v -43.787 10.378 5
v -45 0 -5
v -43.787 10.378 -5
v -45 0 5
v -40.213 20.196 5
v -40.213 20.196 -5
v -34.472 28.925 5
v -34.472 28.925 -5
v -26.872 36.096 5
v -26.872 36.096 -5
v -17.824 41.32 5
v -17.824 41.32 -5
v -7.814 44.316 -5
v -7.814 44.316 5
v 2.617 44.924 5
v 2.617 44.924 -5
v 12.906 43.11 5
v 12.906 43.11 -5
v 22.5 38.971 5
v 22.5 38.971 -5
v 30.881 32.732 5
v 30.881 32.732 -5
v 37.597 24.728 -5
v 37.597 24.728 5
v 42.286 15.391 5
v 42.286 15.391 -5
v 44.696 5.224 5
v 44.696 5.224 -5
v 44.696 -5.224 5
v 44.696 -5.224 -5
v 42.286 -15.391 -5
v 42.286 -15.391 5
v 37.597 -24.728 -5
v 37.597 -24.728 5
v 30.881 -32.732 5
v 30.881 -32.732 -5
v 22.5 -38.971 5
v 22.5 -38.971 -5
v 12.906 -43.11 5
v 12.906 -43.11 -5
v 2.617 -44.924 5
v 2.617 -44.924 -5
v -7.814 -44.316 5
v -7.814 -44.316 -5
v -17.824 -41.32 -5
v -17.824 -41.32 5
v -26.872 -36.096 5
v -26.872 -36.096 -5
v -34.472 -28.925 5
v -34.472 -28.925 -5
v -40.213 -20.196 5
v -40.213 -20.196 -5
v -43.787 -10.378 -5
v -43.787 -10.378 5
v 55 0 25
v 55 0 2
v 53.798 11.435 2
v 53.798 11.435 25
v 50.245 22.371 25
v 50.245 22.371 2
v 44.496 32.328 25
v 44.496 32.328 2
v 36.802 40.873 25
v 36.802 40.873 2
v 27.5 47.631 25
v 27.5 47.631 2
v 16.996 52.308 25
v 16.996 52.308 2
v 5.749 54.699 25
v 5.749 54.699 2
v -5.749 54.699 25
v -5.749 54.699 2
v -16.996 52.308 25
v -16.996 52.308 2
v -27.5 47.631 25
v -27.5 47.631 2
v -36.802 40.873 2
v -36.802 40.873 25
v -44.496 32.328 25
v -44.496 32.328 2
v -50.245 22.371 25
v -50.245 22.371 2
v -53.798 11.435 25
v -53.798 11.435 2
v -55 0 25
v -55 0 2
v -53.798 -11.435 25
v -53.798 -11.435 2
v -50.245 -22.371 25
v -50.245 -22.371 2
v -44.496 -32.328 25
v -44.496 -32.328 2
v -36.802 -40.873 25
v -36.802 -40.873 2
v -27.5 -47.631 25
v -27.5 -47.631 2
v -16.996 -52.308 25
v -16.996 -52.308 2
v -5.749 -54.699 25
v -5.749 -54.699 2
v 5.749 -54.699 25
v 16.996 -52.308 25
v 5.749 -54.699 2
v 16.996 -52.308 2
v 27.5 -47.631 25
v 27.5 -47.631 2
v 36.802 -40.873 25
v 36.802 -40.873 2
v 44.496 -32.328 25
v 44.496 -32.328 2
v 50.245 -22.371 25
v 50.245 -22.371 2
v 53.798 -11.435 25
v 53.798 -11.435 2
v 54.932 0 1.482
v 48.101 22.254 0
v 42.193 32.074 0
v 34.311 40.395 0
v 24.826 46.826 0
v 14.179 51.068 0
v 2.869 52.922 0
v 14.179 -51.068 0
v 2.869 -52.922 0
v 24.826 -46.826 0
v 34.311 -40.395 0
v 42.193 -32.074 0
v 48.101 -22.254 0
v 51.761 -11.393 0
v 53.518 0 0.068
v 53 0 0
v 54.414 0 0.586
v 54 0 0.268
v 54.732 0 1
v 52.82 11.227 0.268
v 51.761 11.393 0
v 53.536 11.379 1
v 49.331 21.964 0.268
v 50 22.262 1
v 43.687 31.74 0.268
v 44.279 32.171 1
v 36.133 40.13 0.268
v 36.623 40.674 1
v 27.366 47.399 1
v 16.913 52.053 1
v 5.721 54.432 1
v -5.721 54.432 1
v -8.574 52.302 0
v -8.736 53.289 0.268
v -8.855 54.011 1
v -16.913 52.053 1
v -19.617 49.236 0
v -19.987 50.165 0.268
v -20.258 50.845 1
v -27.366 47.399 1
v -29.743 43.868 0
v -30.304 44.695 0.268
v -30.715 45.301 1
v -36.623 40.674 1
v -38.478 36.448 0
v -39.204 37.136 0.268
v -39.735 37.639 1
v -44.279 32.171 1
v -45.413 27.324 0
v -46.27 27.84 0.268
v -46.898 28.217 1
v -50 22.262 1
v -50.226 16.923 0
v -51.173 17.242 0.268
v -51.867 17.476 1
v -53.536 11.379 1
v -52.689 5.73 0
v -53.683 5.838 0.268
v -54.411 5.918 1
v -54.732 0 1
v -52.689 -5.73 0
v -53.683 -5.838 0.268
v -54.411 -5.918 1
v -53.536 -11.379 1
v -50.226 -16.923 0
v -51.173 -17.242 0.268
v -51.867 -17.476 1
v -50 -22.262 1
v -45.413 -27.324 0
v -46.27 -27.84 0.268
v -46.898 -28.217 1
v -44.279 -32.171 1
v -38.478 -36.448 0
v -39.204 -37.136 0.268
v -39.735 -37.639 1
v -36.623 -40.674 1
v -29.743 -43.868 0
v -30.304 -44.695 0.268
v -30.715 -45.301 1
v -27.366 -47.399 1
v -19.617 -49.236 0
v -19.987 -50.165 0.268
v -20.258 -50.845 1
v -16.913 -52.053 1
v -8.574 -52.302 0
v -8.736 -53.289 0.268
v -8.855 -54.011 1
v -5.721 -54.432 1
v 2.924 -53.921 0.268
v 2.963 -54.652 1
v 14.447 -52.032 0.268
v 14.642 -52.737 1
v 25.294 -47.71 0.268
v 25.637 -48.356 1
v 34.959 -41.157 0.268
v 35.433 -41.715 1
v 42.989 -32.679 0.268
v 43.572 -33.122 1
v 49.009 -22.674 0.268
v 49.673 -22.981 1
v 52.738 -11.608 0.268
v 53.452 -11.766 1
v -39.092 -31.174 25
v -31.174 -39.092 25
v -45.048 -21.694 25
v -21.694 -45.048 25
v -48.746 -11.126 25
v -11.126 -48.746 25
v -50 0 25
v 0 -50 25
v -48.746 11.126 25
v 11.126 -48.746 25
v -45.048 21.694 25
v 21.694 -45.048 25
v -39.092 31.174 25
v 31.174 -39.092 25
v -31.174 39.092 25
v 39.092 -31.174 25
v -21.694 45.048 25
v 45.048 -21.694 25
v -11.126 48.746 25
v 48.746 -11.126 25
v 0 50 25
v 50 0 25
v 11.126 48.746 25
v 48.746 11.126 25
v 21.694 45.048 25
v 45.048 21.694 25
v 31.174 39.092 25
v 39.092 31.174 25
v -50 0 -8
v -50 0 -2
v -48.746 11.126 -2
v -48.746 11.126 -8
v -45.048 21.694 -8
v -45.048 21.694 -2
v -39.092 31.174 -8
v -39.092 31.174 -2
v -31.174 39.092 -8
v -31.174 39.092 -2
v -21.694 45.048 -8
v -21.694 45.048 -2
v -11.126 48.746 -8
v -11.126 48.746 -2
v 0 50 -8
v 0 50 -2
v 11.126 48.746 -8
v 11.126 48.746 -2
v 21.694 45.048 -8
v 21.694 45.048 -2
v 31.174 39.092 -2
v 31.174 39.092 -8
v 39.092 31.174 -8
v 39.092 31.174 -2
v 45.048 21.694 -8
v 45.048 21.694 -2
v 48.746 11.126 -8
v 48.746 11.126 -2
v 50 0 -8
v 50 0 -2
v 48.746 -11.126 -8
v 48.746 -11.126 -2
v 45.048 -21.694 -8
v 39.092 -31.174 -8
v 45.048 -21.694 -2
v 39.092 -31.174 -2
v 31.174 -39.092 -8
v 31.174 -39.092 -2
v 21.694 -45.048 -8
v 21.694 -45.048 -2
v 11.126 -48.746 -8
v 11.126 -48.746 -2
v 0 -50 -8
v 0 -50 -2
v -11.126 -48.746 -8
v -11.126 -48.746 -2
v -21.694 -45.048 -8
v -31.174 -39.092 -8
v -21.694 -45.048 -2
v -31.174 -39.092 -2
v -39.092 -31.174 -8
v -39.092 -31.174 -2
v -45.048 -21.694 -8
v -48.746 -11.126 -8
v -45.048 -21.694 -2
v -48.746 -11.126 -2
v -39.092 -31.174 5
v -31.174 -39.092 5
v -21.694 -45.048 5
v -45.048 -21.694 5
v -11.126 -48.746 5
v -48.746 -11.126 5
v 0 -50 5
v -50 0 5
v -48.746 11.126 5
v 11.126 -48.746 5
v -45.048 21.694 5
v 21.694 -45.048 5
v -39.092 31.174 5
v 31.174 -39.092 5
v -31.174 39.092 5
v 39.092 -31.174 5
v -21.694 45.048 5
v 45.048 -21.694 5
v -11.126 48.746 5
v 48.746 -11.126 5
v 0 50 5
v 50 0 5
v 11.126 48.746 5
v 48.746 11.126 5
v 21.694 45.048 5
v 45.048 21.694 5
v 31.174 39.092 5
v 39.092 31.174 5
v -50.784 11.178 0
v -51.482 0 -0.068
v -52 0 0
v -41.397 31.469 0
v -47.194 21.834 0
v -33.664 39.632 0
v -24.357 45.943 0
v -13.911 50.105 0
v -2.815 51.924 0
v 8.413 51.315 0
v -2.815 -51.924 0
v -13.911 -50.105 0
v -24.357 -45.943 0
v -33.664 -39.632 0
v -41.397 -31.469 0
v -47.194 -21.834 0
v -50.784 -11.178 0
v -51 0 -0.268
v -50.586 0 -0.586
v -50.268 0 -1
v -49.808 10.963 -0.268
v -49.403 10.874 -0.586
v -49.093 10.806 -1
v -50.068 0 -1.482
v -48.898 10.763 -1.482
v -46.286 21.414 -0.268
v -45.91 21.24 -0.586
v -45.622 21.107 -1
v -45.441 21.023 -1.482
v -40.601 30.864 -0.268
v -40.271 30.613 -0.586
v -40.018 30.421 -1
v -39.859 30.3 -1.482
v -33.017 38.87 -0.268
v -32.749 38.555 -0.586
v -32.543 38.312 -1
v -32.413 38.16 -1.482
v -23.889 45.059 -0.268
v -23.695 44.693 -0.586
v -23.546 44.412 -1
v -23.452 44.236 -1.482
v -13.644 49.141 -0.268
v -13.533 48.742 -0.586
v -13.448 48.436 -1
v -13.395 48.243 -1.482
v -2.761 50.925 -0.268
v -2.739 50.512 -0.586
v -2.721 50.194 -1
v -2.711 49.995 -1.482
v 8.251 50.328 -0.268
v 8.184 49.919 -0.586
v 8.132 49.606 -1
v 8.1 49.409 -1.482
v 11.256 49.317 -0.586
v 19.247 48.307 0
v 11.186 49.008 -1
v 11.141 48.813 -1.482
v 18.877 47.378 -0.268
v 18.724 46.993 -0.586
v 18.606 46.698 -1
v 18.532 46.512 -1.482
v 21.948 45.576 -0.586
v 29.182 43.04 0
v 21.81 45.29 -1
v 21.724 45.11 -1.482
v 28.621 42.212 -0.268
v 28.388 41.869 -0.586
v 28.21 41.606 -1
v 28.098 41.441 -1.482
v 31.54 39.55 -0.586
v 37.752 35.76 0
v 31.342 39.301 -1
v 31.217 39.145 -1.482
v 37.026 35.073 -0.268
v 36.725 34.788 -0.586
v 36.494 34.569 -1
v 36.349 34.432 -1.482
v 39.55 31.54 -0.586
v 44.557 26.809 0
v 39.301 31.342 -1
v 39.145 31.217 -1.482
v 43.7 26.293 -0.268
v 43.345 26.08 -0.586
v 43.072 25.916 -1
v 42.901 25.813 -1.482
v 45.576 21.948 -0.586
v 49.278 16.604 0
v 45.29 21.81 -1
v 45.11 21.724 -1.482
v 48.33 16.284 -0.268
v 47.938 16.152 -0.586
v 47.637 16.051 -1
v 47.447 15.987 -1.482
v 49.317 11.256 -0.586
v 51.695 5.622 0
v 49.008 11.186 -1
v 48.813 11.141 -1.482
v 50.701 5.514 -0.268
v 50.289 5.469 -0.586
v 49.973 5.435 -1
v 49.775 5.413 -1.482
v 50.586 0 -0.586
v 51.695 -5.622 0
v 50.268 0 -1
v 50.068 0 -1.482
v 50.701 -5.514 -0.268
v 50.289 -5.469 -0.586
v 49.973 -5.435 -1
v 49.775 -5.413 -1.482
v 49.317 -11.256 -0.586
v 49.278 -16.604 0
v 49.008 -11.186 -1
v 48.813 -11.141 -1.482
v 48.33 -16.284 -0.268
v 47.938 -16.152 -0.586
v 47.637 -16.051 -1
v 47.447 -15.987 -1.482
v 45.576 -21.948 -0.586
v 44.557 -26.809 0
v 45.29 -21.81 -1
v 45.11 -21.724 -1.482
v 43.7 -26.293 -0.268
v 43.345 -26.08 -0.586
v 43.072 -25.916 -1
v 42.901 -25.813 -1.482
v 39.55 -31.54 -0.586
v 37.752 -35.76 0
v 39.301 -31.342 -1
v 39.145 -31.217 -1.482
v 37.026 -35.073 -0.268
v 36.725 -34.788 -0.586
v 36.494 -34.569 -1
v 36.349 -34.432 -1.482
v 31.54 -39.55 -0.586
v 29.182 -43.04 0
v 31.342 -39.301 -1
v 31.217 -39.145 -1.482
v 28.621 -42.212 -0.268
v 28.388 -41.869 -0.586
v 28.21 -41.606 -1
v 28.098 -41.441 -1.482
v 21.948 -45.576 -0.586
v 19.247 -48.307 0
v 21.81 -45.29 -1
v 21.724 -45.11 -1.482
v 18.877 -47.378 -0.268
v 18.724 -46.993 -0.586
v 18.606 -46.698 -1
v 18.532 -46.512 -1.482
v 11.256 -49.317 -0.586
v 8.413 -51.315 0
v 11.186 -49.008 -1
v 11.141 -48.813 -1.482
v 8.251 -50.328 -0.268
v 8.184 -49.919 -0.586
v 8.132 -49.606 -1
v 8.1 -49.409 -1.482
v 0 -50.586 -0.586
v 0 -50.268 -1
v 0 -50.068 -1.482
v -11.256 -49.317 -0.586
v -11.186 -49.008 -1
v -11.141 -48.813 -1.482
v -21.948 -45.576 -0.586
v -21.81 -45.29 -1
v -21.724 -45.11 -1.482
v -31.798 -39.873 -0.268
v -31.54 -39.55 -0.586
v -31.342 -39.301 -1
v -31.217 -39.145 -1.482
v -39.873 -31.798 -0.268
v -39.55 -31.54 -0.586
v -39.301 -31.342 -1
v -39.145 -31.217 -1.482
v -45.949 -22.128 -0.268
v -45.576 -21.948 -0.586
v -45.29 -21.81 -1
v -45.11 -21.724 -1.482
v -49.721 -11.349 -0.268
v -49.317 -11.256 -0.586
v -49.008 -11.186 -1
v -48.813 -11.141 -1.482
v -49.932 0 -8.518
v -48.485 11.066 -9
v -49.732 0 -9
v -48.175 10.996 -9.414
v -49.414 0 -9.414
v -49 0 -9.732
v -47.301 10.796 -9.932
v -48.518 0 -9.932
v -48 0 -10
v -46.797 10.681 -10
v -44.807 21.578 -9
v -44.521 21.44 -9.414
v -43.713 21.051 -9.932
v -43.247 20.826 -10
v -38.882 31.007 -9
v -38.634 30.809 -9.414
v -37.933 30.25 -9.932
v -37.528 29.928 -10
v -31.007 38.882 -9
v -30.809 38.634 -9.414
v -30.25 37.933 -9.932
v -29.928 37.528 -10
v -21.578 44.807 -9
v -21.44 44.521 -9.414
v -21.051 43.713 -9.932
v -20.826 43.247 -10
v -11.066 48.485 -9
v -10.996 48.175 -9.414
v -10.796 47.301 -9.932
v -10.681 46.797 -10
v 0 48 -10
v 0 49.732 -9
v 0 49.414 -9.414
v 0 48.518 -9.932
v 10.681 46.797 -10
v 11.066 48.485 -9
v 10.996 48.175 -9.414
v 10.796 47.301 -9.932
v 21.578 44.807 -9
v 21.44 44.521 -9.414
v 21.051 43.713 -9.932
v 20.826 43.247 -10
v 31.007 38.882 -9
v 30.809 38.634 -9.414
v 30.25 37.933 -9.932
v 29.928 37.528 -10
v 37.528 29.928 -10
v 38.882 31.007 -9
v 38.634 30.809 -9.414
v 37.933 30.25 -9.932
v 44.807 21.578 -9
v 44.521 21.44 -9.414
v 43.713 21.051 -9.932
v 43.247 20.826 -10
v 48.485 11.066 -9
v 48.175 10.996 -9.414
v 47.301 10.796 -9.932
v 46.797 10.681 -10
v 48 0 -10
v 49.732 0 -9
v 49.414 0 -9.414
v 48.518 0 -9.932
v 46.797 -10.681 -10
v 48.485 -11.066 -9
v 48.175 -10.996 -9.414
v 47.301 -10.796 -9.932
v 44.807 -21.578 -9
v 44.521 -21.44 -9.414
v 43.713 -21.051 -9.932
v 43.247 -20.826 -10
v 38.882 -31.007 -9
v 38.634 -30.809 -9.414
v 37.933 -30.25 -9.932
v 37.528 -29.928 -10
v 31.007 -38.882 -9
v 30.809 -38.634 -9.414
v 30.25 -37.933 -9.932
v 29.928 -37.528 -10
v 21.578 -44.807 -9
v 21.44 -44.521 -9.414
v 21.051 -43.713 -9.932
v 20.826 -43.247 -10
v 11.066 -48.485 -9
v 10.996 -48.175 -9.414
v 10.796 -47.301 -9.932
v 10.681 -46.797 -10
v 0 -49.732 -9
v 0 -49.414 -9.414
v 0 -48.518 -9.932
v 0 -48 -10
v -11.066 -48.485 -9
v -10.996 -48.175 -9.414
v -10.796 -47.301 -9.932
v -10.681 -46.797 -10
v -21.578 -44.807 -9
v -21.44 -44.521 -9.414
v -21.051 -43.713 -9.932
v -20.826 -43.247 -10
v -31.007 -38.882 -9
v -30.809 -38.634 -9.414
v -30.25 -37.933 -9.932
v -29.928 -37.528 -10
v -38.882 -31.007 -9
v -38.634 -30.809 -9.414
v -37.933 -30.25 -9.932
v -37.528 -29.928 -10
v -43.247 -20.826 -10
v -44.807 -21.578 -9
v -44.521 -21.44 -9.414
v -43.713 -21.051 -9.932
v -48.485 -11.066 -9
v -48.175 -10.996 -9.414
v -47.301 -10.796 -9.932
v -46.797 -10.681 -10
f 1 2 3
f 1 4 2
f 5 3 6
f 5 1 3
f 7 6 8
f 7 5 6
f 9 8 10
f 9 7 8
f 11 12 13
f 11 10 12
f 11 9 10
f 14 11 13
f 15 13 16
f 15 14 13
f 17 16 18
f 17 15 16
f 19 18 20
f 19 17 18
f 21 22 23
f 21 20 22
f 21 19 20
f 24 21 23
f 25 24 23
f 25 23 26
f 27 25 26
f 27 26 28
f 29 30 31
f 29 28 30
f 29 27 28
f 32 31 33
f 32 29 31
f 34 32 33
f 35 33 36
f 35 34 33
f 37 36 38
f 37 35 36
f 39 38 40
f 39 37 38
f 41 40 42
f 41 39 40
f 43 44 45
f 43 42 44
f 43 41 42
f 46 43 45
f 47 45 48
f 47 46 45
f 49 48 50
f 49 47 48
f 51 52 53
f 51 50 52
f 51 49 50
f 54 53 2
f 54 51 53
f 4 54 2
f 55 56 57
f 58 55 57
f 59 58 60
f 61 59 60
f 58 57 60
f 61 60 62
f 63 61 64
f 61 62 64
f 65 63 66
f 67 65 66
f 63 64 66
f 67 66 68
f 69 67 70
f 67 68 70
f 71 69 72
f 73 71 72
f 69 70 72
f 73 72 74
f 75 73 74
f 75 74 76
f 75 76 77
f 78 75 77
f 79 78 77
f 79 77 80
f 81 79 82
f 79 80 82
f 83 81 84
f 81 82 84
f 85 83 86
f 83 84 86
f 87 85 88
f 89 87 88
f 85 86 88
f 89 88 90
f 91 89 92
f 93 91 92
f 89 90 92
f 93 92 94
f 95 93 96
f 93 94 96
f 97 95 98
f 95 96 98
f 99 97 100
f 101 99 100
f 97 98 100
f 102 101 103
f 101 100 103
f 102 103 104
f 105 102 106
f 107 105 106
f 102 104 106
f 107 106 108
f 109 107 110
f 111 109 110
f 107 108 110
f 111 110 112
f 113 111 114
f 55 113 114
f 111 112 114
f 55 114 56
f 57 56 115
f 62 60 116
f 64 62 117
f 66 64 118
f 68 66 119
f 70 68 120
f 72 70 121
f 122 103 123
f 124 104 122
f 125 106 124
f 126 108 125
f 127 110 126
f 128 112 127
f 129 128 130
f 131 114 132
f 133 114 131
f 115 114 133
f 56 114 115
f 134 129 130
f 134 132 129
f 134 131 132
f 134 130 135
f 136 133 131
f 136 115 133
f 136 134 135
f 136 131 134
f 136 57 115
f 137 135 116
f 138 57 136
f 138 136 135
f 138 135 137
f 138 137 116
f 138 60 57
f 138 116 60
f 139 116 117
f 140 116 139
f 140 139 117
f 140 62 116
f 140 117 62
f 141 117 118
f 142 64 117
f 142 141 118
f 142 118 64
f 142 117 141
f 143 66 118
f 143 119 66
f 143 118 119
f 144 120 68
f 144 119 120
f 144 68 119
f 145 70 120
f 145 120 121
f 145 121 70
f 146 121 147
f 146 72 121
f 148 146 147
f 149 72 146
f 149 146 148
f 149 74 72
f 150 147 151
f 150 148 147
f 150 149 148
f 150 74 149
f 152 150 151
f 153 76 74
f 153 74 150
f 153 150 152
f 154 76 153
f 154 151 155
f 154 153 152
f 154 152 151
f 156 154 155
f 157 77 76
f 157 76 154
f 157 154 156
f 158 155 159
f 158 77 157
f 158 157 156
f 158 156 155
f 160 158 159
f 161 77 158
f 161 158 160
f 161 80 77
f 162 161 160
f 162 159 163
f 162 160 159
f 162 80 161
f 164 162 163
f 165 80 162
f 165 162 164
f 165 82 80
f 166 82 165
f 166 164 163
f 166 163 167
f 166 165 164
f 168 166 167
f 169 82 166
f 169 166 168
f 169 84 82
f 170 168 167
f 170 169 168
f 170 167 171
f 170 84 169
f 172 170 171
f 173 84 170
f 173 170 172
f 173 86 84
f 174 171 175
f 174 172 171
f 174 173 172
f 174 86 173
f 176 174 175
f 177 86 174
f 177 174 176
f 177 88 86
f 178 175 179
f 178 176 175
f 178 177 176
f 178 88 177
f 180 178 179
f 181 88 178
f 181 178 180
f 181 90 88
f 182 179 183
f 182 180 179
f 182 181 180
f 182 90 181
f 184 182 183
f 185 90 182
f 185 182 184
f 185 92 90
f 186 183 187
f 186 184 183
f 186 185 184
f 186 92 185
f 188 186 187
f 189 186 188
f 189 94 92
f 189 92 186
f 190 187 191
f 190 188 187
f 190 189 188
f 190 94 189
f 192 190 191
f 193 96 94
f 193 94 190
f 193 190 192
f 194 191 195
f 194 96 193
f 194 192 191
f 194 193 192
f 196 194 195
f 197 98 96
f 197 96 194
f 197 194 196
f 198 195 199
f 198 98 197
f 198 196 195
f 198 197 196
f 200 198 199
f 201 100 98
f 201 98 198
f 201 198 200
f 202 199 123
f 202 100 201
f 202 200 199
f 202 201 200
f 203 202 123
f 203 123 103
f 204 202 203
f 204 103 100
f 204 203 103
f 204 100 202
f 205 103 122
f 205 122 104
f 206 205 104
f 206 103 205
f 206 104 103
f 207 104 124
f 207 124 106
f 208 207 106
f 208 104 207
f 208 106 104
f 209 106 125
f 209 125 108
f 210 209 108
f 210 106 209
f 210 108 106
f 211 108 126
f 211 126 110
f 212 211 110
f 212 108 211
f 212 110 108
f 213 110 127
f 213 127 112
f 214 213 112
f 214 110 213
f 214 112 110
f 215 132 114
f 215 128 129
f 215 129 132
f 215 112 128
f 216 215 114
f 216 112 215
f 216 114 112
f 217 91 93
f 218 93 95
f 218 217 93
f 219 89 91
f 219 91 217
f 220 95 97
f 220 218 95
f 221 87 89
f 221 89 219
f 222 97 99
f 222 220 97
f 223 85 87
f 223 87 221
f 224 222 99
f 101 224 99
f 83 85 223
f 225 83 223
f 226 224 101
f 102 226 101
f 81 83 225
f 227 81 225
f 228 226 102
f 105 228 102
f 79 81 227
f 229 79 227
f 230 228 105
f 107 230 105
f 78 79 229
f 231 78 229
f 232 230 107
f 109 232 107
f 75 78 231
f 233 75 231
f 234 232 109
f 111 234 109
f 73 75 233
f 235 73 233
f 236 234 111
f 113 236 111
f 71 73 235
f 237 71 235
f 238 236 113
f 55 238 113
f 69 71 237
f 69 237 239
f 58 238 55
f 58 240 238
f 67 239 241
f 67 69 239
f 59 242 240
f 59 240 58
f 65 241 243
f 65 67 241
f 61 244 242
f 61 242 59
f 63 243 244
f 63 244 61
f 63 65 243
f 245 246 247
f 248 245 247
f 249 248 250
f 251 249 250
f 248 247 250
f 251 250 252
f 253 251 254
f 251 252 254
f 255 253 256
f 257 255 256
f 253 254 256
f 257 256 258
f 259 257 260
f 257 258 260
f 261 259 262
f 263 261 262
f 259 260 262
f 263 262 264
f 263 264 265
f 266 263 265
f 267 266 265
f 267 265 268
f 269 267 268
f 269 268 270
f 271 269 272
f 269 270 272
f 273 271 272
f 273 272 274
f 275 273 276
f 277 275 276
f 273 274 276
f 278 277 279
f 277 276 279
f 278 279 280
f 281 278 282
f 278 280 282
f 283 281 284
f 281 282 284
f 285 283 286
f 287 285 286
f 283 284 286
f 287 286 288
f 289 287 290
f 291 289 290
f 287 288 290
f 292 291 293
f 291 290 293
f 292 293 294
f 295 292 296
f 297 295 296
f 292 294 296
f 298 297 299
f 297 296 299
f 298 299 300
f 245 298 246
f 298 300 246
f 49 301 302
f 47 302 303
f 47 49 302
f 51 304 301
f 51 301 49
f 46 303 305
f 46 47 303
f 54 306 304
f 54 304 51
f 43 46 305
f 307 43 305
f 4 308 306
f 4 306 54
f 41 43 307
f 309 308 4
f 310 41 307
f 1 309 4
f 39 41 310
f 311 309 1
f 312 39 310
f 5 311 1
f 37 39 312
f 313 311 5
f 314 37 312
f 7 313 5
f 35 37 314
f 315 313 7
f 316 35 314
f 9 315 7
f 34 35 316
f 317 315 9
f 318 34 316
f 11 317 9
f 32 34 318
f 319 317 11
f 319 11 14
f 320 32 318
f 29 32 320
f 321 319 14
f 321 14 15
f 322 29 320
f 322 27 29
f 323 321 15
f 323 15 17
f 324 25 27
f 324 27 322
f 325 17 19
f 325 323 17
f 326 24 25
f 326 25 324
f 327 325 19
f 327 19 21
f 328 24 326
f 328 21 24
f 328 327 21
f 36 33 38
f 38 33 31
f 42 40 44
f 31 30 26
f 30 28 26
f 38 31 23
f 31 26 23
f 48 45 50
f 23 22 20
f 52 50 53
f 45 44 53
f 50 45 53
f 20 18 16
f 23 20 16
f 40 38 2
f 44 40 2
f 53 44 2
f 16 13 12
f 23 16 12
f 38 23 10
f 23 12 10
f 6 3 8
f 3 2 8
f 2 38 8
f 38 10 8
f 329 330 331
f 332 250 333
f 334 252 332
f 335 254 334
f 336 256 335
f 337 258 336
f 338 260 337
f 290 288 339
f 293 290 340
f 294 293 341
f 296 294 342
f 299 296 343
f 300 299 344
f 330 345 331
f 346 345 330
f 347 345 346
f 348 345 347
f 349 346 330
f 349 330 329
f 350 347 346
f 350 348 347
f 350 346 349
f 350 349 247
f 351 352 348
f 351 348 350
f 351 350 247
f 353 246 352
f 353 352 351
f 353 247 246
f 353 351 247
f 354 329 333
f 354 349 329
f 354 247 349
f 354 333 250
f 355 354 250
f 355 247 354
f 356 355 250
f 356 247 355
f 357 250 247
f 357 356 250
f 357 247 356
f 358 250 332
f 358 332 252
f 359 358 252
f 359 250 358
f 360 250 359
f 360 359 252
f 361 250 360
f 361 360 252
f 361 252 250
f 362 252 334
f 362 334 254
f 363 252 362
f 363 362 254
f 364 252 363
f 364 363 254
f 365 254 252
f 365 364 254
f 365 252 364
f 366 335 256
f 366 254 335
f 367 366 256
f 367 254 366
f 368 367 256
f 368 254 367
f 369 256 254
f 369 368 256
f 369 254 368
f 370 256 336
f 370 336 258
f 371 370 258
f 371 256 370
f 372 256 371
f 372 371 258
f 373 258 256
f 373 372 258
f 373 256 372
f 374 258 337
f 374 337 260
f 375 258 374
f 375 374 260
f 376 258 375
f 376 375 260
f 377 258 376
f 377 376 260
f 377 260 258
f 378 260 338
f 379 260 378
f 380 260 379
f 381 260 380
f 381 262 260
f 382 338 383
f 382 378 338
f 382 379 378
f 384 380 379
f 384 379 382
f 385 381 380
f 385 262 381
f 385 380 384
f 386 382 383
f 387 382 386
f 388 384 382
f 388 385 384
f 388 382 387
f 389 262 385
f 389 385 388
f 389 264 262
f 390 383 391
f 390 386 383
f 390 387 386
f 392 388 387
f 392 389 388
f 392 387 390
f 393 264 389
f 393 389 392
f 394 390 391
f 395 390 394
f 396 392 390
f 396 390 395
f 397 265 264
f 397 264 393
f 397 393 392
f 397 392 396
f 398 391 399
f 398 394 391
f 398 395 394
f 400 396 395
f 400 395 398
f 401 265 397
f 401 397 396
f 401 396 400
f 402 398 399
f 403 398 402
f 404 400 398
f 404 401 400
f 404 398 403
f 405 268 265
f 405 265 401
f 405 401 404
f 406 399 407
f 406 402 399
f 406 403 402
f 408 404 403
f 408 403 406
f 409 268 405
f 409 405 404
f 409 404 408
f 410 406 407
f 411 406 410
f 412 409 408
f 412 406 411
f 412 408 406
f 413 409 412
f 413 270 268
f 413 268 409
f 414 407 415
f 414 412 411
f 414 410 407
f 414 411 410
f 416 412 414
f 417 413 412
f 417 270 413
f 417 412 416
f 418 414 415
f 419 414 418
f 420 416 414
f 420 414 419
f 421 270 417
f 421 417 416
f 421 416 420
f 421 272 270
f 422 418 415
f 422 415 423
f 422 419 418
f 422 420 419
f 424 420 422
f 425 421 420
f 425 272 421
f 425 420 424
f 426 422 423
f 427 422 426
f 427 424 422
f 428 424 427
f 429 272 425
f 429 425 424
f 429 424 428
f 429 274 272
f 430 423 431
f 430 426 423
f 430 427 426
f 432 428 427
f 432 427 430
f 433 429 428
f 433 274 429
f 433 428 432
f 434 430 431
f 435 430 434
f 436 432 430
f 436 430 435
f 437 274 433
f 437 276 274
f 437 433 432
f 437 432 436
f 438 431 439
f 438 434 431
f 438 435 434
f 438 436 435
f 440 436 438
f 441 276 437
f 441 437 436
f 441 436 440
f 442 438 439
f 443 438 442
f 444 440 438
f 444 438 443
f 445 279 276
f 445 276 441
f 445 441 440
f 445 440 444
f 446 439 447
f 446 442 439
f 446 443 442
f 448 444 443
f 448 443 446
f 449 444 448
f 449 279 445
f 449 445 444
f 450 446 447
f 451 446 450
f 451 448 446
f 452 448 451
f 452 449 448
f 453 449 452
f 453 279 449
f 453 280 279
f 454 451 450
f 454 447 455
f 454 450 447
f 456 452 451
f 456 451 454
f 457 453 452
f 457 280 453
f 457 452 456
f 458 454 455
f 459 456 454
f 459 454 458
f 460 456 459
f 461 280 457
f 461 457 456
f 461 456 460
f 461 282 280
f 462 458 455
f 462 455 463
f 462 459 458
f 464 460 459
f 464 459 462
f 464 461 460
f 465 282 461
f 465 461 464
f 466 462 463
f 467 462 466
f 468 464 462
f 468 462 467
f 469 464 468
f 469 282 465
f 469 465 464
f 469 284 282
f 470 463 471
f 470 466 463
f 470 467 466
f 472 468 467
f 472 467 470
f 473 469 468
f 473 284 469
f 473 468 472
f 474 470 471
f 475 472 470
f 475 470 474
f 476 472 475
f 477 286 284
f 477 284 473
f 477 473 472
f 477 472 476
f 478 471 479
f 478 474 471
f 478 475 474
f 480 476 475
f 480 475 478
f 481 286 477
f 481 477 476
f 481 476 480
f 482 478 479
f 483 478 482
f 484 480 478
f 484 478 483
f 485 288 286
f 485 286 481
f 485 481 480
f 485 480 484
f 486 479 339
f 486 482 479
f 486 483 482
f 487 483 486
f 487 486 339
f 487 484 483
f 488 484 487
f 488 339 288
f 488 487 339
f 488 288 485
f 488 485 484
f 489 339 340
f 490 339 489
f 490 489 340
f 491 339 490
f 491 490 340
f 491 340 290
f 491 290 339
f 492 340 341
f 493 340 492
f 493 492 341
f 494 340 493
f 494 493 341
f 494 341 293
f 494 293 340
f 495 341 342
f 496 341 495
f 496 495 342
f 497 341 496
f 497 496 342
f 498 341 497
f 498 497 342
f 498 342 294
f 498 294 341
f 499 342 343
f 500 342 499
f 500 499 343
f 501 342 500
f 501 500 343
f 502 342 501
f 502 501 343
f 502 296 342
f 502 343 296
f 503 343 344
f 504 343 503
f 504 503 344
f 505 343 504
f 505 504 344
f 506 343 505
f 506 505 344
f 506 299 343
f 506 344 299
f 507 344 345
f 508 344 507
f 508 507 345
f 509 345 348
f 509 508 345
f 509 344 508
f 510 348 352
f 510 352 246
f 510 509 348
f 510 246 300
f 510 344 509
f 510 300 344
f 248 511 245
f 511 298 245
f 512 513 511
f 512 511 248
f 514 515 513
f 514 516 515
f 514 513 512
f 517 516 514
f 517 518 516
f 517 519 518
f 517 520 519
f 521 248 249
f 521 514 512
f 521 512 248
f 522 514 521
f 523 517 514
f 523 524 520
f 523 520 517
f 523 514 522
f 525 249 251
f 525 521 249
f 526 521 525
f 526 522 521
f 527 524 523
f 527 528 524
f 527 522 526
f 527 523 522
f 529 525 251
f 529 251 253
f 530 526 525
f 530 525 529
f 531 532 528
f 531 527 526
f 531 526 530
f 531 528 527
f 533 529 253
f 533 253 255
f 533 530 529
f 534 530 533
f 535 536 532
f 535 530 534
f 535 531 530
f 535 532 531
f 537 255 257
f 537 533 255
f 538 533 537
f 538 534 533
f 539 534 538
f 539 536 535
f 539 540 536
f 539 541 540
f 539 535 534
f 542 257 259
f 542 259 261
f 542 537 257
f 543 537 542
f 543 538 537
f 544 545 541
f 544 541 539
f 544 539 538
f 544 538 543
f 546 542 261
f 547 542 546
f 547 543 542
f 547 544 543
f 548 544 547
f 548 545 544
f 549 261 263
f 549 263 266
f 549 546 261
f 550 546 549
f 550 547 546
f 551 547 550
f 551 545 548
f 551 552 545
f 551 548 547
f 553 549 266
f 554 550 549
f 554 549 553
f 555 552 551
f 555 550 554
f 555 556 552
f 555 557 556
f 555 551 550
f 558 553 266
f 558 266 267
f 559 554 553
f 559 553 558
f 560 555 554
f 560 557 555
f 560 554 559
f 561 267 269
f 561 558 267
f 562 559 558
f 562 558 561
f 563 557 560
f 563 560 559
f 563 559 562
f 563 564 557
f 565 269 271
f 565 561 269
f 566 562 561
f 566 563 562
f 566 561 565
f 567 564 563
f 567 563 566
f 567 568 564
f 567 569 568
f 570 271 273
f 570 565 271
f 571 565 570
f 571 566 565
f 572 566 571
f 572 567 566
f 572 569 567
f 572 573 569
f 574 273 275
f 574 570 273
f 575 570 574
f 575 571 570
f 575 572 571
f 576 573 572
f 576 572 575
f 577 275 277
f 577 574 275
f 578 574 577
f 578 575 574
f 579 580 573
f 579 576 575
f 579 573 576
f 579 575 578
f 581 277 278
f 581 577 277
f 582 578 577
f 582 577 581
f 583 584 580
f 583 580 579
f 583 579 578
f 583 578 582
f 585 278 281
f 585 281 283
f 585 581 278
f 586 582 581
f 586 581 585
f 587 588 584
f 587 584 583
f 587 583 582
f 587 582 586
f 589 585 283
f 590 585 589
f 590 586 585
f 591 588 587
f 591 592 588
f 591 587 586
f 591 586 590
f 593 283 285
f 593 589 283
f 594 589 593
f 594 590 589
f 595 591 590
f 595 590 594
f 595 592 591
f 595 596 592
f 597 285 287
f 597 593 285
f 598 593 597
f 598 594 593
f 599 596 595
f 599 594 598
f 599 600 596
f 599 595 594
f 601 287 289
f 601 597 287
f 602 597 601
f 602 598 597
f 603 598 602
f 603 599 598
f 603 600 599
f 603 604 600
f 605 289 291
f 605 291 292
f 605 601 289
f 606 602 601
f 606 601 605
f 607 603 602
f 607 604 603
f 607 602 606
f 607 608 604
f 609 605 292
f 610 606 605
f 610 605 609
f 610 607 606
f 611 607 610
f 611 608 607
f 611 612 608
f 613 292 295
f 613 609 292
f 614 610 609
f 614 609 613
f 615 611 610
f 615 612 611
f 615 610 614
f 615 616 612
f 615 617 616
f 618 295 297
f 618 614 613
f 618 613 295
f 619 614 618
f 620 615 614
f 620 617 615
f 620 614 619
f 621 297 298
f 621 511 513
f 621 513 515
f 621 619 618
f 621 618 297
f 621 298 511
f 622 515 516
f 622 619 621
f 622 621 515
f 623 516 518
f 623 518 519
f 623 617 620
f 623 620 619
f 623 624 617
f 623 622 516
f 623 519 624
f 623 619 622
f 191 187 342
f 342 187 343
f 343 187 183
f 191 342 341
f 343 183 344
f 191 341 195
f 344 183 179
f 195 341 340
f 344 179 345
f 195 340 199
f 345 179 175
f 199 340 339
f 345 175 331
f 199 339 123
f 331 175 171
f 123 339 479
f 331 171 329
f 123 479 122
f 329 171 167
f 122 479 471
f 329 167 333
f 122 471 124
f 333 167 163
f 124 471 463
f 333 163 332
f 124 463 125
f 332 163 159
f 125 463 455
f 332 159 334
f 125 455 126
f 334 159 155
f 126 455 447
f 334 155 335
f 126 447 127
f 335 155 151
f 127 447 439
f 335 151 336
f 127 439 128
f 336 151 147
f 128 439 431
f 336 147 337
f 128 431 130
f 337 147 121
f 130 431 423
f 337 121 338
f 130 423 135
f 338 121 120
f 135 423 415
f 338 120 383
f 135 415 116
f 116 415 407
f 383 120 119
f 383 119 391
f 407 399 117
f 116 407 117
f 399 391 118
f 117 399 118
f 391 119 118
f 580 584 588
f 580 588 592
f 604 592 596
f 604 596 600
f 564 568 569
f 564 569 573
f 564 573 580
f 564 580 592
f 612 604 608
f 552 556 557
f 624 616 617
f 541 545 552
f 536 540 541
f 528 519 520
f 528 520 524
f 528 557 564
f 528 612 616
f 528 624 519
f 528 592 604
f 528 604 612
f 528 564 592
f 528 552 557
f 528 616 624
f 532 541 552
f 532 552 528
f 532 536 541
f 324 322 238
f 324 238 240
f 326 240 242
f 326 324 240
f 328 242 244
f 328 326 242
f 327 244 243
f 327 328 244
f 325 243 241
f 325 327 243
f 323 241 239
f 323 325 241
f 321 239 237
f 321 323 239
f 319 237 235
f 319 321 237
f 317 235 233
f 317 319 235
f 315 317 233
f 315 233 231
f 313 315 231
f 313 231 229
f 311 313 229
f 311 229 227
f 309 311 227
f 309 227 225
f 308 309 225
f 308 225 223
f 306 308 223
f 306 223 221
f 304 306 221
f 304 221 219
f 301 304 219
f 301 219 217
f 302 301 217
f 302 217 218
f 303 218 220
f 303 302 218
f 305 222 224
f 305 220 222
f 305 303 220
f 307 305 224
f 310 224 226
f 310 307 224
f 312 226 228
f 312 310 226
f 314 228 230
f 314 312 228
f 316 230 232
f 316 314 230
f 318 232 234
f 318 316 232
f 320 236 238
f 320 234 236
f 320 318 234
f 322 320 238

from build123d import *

# Parameters (mm, degrees)
ESBO_O1_R                = 55
RESSALTO_EXTRUS_O1_DEPTH = 25
ESBO_O2_R                = 50
RESSALTO_EXTRUS_O2_DEPTH = 10
CASCA1_T                 = -5
FILETE2_R                = 2
FILETE3_R                = 2


with BuildPart() as part:
    # Esboço1 → Ressalto-extrusão1 (new body)
    with BuildSketch(Plane.XY):
        Circle(ESBO_O1_R)
    extrude(amount=RESSALTO_EXTRUS_O1_DEPTH)

    # Esboço2 → Ressalto-extrusão2 (add)
    with BuildSketch(Plane(origin=(0, 0, 0), x_dir=(-1, 0, 0), z_dir=(0, 0, -1))):
        Circle(ESBO_O2_R)
    extrude(amount=RESSALTO_EXTRUS_O2_DEPTH)

    # Casca1
    casca1_openings = [part.faces().sort_by_distance(p)[0] for p in [
        (0, 0, 25),
    ]]
    offset(amount=CASCA1_T, openings=casca1_openings, kind=Kind.INTERSECTION)

    # Filete2
    filete2_edges = [part.edges().sort_by_distance(p)[0] for p in [
        (50, 0, 0),
        (50, 0, -10),
    ]]
    fillet(filete2_edges, radius=FILETE2_R)

    # Filete3
    filete3_edges = [part.edges().sort_by_distance(p)[0] for p in [
        (-55, 0, 0),
    ]]
    fillet(filete3_edges, radius=FILETE3_R)


solid = part.part
